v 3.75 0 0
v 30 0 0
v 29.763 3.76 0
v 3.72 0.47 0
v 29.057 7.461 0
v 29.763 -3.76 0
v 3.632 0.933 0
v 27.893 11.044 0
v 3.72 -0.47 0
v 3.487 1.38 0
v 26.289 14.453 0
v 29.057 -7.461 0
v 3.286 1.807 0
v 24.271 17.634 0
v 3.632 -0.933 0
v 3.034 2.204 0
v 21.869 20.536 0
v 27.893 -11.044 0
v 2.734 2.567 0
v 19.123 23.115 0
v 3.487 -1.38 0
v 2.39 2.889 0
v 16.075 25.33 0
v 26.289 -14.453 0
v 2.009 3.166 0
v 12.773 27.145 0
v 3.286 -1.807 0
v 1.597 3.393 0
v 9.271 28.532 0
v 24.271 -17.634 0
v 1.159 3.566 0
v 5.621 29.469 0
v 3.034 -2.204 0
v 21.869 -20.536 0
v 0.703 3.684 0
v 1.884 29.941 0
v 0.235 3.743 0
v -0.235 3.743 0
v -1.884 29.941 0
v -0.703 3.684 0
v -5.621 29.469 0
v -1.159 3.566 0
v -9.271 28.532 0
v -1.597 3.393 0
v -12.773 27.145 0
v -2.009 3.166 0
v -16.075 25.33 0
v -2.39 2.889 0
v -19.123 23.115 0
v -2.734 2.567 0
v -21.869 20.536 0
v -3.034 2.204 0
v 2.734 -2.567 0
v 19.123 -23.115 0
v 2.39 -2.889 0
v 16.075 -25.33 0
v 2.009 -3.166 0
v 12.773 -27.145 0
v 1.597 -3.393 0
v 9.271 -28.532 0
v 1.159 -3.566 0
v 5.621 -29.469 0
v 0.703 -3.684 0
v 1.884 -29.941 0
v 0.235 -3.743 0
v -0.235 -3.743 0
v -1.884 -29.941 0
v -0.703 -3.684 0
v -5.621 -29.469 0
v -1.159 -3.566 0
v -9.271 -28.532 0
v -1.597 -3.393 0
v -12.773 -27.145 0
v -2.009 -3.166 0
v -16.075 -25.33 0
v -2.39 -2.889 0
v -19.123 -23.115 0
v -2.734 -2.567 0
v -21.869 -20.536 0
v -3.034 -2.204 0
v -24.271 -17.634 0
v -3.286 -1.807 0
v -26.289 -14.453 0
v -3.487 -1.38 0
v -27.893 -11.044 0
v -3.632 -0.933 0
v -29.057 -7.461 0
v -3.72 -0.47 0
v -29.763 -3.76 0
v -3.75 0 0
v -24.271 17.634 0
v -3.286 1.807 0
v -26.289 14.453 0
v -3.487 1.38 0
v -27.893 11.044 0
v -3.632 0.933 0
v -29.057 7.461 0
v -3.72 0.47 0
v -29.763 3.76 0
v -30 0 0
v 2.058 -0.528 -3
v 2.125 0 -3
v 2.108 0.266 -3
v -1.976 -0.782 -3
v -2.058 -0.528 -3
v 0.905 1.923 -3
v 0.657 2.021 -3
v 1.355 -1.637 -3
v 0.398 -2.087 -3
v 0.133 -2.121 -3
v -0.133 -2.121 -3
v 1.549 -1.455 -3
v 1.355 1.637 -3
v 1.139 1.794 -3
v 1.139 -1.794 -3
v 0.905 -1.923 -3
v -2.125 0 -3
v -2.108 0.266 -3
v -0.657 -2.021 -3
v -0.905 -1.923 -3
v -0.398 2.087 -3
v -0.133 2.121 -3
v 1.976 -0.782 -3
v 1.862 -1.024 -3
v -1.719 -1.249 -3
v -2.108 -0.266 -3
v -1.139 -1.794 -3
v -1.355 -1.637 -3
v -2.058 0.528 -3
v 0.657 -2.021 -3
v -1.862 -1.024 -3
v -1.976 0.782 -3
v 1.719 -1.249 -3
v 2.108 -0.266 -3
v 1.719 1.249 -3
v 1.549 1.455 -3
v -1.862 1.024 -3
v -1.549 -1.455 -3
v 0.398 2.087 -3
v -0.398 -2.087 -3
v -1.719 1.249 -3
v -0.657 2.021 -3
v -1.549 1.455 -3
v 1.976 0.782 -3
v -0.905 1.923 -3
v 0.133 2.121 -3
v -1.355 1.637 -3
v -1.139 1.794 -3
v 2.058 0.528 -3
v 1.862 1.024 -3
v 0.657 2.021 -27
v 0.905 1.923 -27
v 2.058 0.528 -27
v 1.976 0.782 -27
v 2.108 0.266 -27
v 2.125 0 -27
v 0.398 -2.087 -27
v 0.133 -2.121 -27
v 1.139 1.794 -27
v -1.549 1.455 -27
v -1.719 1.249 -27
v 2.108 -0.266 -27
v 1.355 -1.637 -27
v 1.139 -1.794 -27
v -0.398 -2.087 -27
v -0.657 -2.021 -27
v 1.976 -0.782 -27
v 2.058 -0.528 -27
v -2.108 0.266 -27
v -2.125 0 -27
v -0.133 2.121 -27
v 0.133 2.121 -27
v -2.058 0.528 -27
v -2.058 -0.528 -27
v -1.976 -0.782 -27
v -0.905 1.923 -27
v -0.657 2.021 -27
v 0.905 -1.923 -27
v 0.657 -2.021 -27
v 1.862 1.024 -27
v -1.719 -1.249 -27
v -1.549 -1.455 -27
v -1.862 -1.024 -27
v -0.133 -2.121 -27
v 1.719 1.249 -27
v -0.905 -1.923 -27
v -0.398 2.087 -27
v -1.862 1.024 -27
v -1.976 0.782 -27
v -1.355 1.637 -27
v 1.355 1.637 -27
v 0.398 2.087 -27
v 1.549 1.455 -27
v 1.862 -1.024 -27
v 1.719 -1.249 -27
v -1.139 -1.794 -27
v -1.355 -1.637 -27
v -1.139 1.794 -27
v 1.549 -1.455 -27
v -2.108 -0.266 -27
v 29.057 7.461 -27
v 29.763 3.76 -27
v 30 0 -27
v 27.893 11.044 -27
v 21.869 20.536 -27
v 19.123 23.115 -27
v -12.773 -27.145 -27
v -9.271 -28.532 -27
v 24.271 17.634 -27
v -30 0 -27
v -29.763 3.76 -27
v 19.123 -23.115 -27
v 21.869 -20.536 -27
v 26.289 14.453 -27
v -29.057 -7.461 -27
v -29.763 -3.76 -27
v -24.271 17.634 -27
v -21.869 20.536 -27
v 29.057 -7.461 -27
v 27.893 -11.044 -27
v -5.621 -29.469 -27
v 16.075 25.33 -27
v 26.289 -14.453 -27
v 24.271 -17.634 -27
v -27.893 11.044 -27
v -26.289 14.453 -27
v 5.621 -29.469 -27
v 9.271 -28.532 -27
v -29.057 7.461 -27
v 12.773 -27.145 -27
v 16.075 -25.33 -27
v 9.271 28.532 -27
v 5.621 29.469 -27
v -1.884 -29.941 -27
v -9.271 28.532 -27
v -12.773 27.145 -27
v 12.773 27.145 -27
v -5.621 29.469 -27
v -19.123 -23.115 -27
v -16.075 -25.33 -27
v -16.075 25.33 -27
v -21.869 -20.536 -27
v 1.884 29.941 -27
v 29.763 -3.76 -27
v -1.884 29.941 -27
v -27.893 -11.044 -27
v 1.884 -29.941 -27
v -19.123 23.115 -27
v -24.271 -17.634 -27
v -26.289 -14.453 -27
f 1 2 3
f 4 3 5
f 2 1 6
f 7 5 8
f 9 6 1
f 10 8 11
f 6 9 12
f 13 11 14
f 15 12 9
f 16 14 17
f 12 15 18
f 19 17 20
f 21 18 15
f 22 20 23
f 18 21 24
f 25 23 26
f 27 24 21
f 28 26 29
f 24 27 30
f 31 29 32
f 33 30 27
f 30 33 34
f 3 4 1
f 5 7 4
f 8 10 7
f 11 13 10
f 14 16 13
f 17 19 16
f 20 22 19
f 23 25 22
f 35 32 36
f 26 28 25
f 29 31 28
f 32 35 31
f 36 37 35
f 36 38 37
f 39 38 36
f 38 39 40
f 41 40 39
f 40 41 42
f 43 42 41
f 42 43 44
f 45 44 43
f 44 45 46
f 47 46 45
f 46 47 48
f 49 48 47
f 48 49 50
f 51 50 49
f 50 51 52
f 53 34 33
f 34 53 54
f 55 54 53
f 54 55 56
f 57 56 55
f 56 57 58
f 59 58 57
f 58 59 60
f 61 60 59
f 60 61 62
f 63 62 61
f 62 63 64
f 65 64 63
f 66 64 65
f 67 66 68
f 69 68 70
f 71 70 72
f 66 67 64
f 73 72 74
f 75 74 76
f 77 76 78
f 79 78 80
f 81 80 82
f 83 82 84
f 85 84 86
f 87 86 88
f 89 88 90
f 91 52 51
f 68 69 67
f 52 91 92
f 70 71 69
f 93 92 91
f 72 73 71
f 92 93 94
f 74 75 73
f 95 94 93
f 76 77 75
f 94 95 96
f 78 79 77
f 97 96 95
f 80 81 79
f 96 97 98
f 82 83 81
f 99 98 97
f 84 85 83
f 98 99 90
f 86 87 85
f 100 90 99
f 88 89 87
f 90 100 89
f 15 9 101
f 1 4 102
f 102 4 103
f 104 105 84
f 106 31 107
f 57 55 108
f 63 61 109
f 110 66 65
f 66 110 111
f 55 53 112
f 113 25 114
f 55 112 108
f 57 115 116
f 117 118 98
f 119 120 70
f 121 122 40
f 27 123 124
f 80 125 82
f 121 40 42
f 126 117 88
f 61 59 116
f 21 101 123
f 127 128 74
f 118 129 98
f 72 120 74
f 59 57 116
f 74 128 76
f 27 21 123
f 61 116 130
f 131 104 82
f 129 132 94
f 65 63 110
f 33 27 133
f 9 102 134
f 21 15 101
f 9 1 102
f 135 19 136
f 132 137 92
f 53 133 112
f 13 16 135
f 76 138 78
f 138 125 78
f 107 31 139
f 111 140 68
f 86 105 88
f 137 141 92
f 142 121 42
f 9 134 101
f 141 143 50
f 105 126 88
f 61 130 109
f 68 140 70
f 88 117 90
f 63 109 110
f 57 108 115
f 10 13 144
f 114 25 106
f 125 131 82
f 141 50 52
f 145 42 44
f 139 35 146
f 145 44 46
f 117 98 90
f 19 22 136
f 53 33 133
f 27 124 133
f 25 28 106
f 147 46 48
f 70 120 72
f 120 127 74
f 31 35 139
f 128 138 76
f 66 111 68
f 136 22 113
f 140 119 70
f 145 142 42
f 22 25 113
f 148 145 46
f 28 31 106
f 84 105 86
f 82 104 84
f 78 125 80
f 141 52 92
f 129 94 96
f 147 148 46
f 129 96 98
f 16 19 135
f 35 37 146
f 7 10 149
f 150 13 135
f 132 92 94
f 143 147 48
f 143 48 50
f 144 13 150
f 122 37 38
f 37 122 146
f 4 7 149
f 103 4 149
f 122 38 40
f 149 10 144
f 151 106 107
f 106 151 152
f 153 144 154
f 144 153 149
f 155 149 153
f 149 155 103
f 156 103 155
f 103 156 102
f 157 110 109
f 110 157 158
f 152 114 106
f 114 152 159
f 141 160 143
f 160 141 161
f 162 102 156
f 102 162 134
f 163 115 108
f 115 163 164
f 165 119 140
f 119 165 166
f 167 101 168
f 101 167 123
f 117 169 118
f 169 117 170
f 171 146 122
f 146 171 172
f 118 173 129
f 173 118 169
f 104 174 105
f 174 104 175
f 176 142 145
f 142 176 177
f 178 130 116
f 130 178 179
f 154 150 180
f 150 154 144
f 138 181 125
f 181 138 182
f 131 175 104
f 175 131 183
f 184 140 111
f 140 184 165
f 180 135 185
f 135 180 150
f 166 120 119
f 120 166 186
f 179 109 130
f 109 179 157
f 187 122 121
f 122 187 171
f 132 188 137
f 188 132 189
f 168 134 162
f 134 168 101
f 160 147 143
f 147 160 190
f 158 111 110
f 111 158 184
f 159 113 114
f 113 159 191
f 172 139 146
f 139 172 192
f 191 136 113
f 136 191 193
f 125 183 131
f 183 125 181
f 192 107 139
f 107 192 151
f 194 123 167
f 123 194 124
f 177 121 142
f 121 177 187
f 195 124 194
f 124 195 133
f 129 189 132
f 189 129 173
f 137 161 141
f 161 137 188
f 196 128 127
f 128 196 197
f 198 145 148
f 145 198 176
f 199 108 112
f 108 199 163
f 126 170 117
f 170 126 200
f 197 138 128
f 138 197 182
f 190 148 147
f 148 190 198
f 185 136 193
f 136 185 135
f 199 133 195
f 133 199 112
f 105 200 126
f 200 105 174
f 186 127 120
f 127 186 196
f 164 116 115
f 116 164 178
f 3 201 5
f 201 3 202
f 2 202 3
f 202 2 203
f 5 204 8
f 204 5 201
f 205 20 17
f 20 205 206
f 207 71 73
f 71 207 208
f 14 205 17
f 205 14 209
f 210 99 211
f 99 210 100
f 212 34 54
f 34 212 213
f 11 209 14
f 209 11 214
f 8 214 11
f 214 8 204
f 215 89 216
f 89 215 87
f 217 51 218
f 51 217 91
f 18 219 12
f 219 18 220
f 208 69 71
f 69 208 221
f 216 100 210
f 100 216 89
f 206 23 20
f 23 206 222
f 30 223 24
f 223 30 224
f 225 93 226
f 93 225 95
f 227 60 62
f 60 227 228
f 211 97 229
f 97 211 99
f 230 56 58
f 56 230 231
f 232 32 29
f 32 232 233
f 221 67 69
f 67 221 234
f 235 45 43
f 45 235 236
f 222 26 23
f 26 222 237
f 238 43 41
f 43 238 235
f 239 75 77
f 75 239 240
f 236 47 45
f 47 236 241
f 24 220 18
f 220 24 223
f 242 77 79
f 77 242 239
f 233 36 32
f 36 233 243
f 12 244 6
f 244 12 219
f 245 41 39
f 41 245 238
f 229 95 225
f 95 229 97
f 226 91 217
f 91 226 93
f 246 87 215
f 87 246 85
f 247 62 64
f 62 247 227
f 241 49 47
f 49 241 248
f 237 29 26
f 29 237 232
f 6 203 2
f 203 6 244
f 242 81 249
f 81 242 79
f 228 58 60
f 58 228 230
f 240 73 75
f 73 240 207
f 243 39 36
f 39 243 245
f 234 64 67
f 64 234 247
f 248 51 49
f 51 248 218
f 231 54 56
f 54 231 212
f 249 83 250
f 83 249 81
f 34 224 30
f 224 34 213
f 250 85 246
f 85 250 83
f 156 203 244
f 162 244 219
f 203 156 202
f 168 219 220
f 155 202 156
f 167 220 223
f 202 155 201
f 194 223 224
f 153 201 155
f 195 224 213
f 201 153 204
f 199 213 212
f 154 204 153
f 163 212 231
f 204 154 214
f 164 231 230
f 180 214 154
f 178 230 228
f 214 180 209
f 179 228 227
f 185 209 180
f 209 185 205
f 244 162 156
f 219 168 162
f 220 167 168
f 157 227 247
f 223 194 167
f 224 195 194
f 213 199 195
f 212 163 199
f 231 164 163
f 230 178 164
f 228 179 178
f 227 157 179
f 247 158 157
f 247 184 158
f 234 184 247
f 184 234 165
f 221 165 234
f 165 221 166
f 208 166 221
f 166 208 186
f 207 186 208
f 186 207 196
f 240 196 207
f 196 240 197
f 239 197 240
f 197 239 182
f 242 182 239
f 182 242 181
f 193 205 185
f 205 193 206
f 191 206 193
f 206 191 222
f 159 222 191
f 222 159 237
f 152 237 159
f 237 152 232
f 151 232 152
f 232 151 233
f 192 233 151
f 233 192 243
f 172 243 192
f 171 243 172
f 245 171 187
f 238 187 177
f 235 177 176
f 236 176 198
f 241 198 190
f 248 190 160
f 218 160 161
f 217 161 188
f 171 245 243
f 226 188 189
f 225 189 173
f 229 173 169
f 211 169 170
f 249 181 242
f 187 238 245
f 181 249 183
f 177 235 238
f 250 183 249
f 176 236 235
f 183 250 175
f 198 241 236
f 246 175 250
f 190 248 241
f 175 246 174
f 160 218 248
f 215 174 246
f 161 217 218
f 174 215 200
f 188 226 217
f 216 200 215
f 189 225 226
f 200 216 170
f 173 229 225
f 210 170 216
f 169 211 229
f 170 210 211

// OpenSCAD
$fn = 50;


difference() {
	union() {
		translate(v = [0, 0, -27.0000000000]) {
			cylinder(h = 27, r = 30.0000000000);
		}
	}
	union() {
		translate(v = [0, 0, 0]) {
			rotate(a = [0, 0, 0]) {
				difference() {
					union() {
						translate(v = [0, 0, -30.0000000000]) {
							cylinder(h = 30, r = 2.0000000000);
						}
						translate(v = [0, 0, -3]) {
							cylinder(h = 3, r1 = 2.1250000000, r2 = 3.7500000000);
						}
						translate(v = [0, 0, -30.0000000000]) {
							cylinder(h = 30, r = 2.1250000000);
						}
						translate(v = [0, 0, -30.0000000000]) {
							cylinder(h = 30, r = 2.0000000000);
						}
					}
					union();
				}
			}
		}
	}
}
